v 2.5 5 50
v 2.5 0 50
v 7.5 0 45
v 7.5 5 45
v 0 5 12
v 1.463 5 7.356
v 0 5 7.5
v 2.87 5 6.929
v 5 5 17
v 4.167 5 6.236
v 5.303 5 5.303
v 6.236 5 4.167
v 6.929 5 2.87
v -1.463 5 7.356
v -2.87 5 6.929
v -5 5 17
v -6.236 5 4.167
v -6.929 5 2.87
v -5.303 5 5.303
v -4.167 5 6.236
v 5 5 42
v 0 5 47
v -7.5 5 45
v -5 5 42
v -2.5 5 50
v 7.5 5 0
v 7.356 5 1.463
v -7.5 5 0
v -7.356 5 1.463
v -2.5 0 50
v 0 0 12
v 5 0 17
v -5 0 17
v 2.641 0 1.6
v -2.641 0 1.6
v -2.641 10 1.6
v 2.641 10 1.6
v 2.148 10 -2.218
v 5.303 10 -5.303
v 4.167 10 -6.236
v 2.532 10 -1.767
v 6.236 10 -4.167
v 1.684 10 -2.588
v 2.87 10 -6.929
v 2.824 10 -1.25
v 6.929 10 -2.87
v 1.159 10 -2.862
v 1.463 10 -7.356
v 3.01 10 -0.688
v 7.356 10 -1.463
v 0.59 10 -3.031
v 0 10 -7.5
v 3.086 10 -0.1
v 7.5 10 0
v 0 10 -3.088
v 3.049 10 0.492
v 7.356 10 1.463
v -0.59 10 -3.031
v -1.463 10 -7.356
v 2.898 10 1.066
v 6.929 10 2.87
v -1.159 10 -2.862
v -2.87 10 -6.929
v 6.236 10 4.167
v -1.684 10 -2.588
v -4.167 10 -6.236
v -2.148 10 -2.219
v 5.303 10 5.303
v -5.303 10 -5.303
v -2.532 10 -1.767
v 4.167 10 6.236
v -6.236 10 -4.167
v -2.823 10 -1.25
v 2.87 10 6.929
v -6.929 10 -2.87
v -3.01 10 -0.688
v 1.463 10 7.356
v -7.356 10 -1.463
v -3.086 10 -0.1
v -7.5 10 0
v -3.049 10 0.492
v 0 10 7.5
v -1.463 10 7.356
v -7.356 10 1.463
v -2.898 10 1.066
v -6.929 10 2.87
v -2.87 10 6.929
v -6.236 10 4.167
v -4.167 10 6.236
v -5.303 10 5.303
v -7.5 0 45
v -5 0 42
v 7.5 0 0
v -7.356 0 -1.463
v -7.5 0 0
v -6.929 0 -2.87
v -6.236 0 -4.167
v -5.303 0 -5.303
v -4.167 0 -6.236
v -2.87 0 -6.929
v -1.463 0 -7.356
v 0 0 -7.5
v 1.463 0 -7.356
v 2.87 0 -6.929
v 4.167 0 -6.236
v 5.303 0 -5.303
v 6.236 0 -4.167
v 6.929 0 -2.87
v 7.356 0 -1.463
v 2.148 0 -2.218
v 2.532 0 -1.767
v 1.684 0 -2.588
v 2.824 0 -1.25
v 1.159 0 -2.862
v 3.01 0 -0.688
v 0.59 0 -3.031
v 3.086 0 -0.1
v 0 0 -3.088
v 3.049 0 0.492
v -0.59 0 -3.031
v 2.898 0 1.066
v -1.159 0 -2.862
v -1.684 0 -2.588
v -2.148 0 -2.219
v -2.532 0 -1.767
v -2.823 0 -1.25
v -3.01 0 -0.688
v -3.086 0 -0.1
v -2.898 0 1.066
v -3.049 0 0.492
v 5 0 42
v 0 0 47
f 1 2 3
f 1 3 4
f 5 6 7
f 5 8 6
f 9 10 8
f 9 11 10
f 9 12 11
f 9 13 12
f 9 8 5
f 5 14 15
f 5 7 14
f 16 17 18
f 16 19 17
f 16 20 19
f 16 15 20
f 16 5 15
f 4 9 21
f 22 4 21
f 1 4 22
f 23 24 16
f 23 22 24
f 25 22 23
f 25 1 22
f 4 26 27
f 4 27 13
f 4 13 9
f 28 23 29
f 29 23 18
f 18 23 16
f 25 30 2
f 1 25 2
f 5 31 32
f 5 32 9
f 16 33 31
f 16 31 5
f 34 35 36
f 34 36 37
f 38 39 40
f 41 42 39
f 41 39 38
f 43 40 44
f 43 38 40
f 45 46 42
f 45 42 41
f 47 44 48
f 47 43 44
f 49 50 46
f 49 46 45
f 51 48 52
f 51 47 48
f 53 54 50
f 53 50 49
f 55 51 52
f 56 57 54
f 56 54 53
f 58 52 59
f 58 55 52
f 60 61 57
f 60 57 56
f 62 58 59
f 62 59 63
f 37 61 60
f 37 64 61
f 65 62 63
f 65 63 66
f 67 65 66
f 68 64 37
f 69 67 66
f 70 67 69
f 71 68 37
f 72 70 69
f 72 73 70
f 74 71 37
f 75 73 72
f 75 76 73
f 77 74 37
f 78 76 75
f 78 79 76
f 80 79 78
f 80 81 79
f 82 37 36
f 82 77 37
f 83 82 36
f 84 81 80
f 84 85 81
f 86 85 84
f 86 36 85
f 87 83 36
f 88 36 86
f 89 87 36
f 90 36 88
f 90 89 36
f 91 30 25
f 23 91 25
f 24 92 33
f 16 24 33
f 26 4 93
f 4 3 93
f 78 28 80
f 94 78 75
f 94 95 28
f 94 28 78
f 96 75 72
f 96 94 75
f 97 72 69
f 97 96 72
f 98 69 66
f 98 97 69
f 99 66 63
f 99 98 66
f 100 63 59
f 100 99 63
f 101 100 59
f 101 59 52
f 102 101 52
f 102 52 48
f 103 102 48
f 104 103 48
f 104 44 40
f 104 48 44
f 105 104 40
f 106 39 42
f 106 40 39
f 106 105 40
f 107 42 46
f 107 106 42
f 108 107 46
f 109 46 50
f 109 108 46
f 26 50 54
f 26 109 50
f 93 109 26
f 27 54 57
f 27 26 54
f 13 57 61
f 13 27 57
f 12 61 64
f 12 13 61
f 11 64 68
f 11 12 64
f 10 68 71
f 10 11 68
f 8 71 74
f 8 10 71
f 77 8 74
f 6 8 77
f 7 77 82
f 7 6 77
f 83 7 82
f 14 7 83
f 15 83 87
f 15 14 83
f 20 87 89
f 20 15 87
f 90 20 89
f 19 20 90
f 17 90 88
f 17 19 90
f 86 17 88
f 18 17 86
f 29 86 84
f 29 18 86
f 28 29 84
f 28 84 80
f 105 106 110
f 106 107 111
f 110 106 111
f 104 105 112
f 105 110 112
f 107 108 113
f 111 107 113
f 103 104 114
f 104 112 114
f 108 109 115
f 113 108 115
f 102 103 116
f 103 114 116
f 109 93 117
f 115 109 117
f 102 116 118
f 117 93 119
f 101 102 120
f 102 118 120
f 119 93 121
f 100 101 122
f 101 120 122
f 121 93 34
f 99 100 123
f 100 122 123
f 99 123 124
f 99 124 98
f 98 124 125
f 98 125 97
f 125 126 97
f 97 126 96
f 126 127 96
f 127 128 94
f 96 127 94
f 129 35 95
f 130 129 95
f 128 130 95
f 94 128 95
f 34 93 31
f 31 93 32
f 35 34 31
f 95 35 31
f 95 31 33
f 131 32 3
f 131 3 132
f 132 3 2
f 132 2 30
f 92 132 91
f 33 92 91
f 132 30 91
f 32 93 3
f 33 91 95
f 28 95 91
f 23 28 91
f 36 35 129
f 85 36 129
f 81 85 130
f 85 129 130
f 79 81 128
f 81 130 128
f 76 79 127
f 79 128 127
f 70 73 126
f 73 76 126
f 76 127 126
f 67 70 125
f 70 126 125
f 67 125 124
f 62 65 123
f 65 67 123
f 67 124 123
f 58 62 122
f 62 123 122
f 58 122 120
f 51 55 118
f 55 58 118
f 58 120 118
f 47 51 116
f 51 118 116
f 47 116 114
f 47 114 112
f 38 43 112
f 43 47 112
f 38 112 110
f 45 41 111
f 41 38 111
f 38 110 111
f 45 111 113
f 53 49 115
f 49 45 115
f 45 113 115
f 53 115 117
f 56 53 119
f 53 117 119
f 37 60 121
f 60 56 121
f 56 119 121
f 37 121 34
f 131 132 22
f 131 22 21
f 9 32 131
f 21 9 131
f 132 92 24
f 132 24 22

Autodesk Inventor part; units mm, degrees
ref_plane "YZ Plane" through (0, 0, 0) normal (1, 0, 0) x (0, 1, 0)
ref_plane "XZ Plane" through (0, 0, 0) normal (0, 1, 0) x (-1, 0, 0)
ref_plane "XY Plane" through (0, 0, 0) normal (0, 0, 1) x (1, 0, 0)
sketch "Sketch1" plane through (0, 0, 0) normal (0, 1, 0) x (-1, 0, 0)
  arc A0 (-2.2913, 1) -> (2.2913, 1) centre (0, 0) ccw
  circle A1 centre (0, 0) radius 3.088
  line L0 (2.6552, 1.6) -> (-2.6552, 1.6)
  line L1 (-2.6411, 1.6) -> (2.6552, 1.6)
  line L2 (2.2913, 1) -> (-2.2913, 1)
  circle A2 centre (0, 0) radius 7.5
  line L3 (7.5, 0) -> (7.5, 50)
  line L4 (7.5, 50) -> (-7.5, 50)
  line L5 (-7.5, 50) -> (-7.5, 0)
  point P0 (2.6411, 1.6)
  point P1 (-2.6411, 1.6)
  dimension "d1" = 15
  dimension "d2" = 50
extrude "Extrusion1" add sketch "Sketch1" along normal blind 10 contours A1 L0 | A2 picked at (0.7371, 1.7852)
extrude "Extrusion2" add sketch "Sketch1" along normal blind 5 contours A2 L5 L4 L3
chamfer "Chamfer1" distance 5 angle 45 2 edges at (-7.5, 2.5, 50) (7.5, 2.5, 50)
sketch "Sketch3" plane through (0, 0, 0) normal (0, -1, 0) x (1, 0, 0)
  line L0 (-5, 42) -> (0, 47)
  line L1 (-2.5, 50) -> (-7.5, 45) projected
  line L2 (0, 47) -> (5, 42)
  line L3 (5, 42) -> (-5, 42)
  line L4 (-5, 42) -> (-5, 12)
  line L5 (5, 12) -> (5, 42)
  line L6 (-2.5, 50) -> (2.5, 50) projected
  line L7 (-5, 12) -> (-5, 5.5902)
  arc A0 (7.5, 0) -> (-7.5, 0) centre (0, 0) ccw projected
  line L8 (5, 12) -> (5, 5.5902)
  circle A1 centre (0, 0) radius 7.5 projected
  line L9 (5, 12) -> (-5, 12)
  dimension "d13" = 10
  dimension "d14" = 30
  dimension "d15" = 3
extrude "Extrusion3" cut sketch "Sketch3" against normal blind 5.5 contours L0 L2 L3 | L3 L5 L9 L4
chamfer "Chamfer2" distance 5 angle 45 2 edges at (-5, 2.5, 12) (5, 2.5, 12)
properties part number "StepMotorTest"
